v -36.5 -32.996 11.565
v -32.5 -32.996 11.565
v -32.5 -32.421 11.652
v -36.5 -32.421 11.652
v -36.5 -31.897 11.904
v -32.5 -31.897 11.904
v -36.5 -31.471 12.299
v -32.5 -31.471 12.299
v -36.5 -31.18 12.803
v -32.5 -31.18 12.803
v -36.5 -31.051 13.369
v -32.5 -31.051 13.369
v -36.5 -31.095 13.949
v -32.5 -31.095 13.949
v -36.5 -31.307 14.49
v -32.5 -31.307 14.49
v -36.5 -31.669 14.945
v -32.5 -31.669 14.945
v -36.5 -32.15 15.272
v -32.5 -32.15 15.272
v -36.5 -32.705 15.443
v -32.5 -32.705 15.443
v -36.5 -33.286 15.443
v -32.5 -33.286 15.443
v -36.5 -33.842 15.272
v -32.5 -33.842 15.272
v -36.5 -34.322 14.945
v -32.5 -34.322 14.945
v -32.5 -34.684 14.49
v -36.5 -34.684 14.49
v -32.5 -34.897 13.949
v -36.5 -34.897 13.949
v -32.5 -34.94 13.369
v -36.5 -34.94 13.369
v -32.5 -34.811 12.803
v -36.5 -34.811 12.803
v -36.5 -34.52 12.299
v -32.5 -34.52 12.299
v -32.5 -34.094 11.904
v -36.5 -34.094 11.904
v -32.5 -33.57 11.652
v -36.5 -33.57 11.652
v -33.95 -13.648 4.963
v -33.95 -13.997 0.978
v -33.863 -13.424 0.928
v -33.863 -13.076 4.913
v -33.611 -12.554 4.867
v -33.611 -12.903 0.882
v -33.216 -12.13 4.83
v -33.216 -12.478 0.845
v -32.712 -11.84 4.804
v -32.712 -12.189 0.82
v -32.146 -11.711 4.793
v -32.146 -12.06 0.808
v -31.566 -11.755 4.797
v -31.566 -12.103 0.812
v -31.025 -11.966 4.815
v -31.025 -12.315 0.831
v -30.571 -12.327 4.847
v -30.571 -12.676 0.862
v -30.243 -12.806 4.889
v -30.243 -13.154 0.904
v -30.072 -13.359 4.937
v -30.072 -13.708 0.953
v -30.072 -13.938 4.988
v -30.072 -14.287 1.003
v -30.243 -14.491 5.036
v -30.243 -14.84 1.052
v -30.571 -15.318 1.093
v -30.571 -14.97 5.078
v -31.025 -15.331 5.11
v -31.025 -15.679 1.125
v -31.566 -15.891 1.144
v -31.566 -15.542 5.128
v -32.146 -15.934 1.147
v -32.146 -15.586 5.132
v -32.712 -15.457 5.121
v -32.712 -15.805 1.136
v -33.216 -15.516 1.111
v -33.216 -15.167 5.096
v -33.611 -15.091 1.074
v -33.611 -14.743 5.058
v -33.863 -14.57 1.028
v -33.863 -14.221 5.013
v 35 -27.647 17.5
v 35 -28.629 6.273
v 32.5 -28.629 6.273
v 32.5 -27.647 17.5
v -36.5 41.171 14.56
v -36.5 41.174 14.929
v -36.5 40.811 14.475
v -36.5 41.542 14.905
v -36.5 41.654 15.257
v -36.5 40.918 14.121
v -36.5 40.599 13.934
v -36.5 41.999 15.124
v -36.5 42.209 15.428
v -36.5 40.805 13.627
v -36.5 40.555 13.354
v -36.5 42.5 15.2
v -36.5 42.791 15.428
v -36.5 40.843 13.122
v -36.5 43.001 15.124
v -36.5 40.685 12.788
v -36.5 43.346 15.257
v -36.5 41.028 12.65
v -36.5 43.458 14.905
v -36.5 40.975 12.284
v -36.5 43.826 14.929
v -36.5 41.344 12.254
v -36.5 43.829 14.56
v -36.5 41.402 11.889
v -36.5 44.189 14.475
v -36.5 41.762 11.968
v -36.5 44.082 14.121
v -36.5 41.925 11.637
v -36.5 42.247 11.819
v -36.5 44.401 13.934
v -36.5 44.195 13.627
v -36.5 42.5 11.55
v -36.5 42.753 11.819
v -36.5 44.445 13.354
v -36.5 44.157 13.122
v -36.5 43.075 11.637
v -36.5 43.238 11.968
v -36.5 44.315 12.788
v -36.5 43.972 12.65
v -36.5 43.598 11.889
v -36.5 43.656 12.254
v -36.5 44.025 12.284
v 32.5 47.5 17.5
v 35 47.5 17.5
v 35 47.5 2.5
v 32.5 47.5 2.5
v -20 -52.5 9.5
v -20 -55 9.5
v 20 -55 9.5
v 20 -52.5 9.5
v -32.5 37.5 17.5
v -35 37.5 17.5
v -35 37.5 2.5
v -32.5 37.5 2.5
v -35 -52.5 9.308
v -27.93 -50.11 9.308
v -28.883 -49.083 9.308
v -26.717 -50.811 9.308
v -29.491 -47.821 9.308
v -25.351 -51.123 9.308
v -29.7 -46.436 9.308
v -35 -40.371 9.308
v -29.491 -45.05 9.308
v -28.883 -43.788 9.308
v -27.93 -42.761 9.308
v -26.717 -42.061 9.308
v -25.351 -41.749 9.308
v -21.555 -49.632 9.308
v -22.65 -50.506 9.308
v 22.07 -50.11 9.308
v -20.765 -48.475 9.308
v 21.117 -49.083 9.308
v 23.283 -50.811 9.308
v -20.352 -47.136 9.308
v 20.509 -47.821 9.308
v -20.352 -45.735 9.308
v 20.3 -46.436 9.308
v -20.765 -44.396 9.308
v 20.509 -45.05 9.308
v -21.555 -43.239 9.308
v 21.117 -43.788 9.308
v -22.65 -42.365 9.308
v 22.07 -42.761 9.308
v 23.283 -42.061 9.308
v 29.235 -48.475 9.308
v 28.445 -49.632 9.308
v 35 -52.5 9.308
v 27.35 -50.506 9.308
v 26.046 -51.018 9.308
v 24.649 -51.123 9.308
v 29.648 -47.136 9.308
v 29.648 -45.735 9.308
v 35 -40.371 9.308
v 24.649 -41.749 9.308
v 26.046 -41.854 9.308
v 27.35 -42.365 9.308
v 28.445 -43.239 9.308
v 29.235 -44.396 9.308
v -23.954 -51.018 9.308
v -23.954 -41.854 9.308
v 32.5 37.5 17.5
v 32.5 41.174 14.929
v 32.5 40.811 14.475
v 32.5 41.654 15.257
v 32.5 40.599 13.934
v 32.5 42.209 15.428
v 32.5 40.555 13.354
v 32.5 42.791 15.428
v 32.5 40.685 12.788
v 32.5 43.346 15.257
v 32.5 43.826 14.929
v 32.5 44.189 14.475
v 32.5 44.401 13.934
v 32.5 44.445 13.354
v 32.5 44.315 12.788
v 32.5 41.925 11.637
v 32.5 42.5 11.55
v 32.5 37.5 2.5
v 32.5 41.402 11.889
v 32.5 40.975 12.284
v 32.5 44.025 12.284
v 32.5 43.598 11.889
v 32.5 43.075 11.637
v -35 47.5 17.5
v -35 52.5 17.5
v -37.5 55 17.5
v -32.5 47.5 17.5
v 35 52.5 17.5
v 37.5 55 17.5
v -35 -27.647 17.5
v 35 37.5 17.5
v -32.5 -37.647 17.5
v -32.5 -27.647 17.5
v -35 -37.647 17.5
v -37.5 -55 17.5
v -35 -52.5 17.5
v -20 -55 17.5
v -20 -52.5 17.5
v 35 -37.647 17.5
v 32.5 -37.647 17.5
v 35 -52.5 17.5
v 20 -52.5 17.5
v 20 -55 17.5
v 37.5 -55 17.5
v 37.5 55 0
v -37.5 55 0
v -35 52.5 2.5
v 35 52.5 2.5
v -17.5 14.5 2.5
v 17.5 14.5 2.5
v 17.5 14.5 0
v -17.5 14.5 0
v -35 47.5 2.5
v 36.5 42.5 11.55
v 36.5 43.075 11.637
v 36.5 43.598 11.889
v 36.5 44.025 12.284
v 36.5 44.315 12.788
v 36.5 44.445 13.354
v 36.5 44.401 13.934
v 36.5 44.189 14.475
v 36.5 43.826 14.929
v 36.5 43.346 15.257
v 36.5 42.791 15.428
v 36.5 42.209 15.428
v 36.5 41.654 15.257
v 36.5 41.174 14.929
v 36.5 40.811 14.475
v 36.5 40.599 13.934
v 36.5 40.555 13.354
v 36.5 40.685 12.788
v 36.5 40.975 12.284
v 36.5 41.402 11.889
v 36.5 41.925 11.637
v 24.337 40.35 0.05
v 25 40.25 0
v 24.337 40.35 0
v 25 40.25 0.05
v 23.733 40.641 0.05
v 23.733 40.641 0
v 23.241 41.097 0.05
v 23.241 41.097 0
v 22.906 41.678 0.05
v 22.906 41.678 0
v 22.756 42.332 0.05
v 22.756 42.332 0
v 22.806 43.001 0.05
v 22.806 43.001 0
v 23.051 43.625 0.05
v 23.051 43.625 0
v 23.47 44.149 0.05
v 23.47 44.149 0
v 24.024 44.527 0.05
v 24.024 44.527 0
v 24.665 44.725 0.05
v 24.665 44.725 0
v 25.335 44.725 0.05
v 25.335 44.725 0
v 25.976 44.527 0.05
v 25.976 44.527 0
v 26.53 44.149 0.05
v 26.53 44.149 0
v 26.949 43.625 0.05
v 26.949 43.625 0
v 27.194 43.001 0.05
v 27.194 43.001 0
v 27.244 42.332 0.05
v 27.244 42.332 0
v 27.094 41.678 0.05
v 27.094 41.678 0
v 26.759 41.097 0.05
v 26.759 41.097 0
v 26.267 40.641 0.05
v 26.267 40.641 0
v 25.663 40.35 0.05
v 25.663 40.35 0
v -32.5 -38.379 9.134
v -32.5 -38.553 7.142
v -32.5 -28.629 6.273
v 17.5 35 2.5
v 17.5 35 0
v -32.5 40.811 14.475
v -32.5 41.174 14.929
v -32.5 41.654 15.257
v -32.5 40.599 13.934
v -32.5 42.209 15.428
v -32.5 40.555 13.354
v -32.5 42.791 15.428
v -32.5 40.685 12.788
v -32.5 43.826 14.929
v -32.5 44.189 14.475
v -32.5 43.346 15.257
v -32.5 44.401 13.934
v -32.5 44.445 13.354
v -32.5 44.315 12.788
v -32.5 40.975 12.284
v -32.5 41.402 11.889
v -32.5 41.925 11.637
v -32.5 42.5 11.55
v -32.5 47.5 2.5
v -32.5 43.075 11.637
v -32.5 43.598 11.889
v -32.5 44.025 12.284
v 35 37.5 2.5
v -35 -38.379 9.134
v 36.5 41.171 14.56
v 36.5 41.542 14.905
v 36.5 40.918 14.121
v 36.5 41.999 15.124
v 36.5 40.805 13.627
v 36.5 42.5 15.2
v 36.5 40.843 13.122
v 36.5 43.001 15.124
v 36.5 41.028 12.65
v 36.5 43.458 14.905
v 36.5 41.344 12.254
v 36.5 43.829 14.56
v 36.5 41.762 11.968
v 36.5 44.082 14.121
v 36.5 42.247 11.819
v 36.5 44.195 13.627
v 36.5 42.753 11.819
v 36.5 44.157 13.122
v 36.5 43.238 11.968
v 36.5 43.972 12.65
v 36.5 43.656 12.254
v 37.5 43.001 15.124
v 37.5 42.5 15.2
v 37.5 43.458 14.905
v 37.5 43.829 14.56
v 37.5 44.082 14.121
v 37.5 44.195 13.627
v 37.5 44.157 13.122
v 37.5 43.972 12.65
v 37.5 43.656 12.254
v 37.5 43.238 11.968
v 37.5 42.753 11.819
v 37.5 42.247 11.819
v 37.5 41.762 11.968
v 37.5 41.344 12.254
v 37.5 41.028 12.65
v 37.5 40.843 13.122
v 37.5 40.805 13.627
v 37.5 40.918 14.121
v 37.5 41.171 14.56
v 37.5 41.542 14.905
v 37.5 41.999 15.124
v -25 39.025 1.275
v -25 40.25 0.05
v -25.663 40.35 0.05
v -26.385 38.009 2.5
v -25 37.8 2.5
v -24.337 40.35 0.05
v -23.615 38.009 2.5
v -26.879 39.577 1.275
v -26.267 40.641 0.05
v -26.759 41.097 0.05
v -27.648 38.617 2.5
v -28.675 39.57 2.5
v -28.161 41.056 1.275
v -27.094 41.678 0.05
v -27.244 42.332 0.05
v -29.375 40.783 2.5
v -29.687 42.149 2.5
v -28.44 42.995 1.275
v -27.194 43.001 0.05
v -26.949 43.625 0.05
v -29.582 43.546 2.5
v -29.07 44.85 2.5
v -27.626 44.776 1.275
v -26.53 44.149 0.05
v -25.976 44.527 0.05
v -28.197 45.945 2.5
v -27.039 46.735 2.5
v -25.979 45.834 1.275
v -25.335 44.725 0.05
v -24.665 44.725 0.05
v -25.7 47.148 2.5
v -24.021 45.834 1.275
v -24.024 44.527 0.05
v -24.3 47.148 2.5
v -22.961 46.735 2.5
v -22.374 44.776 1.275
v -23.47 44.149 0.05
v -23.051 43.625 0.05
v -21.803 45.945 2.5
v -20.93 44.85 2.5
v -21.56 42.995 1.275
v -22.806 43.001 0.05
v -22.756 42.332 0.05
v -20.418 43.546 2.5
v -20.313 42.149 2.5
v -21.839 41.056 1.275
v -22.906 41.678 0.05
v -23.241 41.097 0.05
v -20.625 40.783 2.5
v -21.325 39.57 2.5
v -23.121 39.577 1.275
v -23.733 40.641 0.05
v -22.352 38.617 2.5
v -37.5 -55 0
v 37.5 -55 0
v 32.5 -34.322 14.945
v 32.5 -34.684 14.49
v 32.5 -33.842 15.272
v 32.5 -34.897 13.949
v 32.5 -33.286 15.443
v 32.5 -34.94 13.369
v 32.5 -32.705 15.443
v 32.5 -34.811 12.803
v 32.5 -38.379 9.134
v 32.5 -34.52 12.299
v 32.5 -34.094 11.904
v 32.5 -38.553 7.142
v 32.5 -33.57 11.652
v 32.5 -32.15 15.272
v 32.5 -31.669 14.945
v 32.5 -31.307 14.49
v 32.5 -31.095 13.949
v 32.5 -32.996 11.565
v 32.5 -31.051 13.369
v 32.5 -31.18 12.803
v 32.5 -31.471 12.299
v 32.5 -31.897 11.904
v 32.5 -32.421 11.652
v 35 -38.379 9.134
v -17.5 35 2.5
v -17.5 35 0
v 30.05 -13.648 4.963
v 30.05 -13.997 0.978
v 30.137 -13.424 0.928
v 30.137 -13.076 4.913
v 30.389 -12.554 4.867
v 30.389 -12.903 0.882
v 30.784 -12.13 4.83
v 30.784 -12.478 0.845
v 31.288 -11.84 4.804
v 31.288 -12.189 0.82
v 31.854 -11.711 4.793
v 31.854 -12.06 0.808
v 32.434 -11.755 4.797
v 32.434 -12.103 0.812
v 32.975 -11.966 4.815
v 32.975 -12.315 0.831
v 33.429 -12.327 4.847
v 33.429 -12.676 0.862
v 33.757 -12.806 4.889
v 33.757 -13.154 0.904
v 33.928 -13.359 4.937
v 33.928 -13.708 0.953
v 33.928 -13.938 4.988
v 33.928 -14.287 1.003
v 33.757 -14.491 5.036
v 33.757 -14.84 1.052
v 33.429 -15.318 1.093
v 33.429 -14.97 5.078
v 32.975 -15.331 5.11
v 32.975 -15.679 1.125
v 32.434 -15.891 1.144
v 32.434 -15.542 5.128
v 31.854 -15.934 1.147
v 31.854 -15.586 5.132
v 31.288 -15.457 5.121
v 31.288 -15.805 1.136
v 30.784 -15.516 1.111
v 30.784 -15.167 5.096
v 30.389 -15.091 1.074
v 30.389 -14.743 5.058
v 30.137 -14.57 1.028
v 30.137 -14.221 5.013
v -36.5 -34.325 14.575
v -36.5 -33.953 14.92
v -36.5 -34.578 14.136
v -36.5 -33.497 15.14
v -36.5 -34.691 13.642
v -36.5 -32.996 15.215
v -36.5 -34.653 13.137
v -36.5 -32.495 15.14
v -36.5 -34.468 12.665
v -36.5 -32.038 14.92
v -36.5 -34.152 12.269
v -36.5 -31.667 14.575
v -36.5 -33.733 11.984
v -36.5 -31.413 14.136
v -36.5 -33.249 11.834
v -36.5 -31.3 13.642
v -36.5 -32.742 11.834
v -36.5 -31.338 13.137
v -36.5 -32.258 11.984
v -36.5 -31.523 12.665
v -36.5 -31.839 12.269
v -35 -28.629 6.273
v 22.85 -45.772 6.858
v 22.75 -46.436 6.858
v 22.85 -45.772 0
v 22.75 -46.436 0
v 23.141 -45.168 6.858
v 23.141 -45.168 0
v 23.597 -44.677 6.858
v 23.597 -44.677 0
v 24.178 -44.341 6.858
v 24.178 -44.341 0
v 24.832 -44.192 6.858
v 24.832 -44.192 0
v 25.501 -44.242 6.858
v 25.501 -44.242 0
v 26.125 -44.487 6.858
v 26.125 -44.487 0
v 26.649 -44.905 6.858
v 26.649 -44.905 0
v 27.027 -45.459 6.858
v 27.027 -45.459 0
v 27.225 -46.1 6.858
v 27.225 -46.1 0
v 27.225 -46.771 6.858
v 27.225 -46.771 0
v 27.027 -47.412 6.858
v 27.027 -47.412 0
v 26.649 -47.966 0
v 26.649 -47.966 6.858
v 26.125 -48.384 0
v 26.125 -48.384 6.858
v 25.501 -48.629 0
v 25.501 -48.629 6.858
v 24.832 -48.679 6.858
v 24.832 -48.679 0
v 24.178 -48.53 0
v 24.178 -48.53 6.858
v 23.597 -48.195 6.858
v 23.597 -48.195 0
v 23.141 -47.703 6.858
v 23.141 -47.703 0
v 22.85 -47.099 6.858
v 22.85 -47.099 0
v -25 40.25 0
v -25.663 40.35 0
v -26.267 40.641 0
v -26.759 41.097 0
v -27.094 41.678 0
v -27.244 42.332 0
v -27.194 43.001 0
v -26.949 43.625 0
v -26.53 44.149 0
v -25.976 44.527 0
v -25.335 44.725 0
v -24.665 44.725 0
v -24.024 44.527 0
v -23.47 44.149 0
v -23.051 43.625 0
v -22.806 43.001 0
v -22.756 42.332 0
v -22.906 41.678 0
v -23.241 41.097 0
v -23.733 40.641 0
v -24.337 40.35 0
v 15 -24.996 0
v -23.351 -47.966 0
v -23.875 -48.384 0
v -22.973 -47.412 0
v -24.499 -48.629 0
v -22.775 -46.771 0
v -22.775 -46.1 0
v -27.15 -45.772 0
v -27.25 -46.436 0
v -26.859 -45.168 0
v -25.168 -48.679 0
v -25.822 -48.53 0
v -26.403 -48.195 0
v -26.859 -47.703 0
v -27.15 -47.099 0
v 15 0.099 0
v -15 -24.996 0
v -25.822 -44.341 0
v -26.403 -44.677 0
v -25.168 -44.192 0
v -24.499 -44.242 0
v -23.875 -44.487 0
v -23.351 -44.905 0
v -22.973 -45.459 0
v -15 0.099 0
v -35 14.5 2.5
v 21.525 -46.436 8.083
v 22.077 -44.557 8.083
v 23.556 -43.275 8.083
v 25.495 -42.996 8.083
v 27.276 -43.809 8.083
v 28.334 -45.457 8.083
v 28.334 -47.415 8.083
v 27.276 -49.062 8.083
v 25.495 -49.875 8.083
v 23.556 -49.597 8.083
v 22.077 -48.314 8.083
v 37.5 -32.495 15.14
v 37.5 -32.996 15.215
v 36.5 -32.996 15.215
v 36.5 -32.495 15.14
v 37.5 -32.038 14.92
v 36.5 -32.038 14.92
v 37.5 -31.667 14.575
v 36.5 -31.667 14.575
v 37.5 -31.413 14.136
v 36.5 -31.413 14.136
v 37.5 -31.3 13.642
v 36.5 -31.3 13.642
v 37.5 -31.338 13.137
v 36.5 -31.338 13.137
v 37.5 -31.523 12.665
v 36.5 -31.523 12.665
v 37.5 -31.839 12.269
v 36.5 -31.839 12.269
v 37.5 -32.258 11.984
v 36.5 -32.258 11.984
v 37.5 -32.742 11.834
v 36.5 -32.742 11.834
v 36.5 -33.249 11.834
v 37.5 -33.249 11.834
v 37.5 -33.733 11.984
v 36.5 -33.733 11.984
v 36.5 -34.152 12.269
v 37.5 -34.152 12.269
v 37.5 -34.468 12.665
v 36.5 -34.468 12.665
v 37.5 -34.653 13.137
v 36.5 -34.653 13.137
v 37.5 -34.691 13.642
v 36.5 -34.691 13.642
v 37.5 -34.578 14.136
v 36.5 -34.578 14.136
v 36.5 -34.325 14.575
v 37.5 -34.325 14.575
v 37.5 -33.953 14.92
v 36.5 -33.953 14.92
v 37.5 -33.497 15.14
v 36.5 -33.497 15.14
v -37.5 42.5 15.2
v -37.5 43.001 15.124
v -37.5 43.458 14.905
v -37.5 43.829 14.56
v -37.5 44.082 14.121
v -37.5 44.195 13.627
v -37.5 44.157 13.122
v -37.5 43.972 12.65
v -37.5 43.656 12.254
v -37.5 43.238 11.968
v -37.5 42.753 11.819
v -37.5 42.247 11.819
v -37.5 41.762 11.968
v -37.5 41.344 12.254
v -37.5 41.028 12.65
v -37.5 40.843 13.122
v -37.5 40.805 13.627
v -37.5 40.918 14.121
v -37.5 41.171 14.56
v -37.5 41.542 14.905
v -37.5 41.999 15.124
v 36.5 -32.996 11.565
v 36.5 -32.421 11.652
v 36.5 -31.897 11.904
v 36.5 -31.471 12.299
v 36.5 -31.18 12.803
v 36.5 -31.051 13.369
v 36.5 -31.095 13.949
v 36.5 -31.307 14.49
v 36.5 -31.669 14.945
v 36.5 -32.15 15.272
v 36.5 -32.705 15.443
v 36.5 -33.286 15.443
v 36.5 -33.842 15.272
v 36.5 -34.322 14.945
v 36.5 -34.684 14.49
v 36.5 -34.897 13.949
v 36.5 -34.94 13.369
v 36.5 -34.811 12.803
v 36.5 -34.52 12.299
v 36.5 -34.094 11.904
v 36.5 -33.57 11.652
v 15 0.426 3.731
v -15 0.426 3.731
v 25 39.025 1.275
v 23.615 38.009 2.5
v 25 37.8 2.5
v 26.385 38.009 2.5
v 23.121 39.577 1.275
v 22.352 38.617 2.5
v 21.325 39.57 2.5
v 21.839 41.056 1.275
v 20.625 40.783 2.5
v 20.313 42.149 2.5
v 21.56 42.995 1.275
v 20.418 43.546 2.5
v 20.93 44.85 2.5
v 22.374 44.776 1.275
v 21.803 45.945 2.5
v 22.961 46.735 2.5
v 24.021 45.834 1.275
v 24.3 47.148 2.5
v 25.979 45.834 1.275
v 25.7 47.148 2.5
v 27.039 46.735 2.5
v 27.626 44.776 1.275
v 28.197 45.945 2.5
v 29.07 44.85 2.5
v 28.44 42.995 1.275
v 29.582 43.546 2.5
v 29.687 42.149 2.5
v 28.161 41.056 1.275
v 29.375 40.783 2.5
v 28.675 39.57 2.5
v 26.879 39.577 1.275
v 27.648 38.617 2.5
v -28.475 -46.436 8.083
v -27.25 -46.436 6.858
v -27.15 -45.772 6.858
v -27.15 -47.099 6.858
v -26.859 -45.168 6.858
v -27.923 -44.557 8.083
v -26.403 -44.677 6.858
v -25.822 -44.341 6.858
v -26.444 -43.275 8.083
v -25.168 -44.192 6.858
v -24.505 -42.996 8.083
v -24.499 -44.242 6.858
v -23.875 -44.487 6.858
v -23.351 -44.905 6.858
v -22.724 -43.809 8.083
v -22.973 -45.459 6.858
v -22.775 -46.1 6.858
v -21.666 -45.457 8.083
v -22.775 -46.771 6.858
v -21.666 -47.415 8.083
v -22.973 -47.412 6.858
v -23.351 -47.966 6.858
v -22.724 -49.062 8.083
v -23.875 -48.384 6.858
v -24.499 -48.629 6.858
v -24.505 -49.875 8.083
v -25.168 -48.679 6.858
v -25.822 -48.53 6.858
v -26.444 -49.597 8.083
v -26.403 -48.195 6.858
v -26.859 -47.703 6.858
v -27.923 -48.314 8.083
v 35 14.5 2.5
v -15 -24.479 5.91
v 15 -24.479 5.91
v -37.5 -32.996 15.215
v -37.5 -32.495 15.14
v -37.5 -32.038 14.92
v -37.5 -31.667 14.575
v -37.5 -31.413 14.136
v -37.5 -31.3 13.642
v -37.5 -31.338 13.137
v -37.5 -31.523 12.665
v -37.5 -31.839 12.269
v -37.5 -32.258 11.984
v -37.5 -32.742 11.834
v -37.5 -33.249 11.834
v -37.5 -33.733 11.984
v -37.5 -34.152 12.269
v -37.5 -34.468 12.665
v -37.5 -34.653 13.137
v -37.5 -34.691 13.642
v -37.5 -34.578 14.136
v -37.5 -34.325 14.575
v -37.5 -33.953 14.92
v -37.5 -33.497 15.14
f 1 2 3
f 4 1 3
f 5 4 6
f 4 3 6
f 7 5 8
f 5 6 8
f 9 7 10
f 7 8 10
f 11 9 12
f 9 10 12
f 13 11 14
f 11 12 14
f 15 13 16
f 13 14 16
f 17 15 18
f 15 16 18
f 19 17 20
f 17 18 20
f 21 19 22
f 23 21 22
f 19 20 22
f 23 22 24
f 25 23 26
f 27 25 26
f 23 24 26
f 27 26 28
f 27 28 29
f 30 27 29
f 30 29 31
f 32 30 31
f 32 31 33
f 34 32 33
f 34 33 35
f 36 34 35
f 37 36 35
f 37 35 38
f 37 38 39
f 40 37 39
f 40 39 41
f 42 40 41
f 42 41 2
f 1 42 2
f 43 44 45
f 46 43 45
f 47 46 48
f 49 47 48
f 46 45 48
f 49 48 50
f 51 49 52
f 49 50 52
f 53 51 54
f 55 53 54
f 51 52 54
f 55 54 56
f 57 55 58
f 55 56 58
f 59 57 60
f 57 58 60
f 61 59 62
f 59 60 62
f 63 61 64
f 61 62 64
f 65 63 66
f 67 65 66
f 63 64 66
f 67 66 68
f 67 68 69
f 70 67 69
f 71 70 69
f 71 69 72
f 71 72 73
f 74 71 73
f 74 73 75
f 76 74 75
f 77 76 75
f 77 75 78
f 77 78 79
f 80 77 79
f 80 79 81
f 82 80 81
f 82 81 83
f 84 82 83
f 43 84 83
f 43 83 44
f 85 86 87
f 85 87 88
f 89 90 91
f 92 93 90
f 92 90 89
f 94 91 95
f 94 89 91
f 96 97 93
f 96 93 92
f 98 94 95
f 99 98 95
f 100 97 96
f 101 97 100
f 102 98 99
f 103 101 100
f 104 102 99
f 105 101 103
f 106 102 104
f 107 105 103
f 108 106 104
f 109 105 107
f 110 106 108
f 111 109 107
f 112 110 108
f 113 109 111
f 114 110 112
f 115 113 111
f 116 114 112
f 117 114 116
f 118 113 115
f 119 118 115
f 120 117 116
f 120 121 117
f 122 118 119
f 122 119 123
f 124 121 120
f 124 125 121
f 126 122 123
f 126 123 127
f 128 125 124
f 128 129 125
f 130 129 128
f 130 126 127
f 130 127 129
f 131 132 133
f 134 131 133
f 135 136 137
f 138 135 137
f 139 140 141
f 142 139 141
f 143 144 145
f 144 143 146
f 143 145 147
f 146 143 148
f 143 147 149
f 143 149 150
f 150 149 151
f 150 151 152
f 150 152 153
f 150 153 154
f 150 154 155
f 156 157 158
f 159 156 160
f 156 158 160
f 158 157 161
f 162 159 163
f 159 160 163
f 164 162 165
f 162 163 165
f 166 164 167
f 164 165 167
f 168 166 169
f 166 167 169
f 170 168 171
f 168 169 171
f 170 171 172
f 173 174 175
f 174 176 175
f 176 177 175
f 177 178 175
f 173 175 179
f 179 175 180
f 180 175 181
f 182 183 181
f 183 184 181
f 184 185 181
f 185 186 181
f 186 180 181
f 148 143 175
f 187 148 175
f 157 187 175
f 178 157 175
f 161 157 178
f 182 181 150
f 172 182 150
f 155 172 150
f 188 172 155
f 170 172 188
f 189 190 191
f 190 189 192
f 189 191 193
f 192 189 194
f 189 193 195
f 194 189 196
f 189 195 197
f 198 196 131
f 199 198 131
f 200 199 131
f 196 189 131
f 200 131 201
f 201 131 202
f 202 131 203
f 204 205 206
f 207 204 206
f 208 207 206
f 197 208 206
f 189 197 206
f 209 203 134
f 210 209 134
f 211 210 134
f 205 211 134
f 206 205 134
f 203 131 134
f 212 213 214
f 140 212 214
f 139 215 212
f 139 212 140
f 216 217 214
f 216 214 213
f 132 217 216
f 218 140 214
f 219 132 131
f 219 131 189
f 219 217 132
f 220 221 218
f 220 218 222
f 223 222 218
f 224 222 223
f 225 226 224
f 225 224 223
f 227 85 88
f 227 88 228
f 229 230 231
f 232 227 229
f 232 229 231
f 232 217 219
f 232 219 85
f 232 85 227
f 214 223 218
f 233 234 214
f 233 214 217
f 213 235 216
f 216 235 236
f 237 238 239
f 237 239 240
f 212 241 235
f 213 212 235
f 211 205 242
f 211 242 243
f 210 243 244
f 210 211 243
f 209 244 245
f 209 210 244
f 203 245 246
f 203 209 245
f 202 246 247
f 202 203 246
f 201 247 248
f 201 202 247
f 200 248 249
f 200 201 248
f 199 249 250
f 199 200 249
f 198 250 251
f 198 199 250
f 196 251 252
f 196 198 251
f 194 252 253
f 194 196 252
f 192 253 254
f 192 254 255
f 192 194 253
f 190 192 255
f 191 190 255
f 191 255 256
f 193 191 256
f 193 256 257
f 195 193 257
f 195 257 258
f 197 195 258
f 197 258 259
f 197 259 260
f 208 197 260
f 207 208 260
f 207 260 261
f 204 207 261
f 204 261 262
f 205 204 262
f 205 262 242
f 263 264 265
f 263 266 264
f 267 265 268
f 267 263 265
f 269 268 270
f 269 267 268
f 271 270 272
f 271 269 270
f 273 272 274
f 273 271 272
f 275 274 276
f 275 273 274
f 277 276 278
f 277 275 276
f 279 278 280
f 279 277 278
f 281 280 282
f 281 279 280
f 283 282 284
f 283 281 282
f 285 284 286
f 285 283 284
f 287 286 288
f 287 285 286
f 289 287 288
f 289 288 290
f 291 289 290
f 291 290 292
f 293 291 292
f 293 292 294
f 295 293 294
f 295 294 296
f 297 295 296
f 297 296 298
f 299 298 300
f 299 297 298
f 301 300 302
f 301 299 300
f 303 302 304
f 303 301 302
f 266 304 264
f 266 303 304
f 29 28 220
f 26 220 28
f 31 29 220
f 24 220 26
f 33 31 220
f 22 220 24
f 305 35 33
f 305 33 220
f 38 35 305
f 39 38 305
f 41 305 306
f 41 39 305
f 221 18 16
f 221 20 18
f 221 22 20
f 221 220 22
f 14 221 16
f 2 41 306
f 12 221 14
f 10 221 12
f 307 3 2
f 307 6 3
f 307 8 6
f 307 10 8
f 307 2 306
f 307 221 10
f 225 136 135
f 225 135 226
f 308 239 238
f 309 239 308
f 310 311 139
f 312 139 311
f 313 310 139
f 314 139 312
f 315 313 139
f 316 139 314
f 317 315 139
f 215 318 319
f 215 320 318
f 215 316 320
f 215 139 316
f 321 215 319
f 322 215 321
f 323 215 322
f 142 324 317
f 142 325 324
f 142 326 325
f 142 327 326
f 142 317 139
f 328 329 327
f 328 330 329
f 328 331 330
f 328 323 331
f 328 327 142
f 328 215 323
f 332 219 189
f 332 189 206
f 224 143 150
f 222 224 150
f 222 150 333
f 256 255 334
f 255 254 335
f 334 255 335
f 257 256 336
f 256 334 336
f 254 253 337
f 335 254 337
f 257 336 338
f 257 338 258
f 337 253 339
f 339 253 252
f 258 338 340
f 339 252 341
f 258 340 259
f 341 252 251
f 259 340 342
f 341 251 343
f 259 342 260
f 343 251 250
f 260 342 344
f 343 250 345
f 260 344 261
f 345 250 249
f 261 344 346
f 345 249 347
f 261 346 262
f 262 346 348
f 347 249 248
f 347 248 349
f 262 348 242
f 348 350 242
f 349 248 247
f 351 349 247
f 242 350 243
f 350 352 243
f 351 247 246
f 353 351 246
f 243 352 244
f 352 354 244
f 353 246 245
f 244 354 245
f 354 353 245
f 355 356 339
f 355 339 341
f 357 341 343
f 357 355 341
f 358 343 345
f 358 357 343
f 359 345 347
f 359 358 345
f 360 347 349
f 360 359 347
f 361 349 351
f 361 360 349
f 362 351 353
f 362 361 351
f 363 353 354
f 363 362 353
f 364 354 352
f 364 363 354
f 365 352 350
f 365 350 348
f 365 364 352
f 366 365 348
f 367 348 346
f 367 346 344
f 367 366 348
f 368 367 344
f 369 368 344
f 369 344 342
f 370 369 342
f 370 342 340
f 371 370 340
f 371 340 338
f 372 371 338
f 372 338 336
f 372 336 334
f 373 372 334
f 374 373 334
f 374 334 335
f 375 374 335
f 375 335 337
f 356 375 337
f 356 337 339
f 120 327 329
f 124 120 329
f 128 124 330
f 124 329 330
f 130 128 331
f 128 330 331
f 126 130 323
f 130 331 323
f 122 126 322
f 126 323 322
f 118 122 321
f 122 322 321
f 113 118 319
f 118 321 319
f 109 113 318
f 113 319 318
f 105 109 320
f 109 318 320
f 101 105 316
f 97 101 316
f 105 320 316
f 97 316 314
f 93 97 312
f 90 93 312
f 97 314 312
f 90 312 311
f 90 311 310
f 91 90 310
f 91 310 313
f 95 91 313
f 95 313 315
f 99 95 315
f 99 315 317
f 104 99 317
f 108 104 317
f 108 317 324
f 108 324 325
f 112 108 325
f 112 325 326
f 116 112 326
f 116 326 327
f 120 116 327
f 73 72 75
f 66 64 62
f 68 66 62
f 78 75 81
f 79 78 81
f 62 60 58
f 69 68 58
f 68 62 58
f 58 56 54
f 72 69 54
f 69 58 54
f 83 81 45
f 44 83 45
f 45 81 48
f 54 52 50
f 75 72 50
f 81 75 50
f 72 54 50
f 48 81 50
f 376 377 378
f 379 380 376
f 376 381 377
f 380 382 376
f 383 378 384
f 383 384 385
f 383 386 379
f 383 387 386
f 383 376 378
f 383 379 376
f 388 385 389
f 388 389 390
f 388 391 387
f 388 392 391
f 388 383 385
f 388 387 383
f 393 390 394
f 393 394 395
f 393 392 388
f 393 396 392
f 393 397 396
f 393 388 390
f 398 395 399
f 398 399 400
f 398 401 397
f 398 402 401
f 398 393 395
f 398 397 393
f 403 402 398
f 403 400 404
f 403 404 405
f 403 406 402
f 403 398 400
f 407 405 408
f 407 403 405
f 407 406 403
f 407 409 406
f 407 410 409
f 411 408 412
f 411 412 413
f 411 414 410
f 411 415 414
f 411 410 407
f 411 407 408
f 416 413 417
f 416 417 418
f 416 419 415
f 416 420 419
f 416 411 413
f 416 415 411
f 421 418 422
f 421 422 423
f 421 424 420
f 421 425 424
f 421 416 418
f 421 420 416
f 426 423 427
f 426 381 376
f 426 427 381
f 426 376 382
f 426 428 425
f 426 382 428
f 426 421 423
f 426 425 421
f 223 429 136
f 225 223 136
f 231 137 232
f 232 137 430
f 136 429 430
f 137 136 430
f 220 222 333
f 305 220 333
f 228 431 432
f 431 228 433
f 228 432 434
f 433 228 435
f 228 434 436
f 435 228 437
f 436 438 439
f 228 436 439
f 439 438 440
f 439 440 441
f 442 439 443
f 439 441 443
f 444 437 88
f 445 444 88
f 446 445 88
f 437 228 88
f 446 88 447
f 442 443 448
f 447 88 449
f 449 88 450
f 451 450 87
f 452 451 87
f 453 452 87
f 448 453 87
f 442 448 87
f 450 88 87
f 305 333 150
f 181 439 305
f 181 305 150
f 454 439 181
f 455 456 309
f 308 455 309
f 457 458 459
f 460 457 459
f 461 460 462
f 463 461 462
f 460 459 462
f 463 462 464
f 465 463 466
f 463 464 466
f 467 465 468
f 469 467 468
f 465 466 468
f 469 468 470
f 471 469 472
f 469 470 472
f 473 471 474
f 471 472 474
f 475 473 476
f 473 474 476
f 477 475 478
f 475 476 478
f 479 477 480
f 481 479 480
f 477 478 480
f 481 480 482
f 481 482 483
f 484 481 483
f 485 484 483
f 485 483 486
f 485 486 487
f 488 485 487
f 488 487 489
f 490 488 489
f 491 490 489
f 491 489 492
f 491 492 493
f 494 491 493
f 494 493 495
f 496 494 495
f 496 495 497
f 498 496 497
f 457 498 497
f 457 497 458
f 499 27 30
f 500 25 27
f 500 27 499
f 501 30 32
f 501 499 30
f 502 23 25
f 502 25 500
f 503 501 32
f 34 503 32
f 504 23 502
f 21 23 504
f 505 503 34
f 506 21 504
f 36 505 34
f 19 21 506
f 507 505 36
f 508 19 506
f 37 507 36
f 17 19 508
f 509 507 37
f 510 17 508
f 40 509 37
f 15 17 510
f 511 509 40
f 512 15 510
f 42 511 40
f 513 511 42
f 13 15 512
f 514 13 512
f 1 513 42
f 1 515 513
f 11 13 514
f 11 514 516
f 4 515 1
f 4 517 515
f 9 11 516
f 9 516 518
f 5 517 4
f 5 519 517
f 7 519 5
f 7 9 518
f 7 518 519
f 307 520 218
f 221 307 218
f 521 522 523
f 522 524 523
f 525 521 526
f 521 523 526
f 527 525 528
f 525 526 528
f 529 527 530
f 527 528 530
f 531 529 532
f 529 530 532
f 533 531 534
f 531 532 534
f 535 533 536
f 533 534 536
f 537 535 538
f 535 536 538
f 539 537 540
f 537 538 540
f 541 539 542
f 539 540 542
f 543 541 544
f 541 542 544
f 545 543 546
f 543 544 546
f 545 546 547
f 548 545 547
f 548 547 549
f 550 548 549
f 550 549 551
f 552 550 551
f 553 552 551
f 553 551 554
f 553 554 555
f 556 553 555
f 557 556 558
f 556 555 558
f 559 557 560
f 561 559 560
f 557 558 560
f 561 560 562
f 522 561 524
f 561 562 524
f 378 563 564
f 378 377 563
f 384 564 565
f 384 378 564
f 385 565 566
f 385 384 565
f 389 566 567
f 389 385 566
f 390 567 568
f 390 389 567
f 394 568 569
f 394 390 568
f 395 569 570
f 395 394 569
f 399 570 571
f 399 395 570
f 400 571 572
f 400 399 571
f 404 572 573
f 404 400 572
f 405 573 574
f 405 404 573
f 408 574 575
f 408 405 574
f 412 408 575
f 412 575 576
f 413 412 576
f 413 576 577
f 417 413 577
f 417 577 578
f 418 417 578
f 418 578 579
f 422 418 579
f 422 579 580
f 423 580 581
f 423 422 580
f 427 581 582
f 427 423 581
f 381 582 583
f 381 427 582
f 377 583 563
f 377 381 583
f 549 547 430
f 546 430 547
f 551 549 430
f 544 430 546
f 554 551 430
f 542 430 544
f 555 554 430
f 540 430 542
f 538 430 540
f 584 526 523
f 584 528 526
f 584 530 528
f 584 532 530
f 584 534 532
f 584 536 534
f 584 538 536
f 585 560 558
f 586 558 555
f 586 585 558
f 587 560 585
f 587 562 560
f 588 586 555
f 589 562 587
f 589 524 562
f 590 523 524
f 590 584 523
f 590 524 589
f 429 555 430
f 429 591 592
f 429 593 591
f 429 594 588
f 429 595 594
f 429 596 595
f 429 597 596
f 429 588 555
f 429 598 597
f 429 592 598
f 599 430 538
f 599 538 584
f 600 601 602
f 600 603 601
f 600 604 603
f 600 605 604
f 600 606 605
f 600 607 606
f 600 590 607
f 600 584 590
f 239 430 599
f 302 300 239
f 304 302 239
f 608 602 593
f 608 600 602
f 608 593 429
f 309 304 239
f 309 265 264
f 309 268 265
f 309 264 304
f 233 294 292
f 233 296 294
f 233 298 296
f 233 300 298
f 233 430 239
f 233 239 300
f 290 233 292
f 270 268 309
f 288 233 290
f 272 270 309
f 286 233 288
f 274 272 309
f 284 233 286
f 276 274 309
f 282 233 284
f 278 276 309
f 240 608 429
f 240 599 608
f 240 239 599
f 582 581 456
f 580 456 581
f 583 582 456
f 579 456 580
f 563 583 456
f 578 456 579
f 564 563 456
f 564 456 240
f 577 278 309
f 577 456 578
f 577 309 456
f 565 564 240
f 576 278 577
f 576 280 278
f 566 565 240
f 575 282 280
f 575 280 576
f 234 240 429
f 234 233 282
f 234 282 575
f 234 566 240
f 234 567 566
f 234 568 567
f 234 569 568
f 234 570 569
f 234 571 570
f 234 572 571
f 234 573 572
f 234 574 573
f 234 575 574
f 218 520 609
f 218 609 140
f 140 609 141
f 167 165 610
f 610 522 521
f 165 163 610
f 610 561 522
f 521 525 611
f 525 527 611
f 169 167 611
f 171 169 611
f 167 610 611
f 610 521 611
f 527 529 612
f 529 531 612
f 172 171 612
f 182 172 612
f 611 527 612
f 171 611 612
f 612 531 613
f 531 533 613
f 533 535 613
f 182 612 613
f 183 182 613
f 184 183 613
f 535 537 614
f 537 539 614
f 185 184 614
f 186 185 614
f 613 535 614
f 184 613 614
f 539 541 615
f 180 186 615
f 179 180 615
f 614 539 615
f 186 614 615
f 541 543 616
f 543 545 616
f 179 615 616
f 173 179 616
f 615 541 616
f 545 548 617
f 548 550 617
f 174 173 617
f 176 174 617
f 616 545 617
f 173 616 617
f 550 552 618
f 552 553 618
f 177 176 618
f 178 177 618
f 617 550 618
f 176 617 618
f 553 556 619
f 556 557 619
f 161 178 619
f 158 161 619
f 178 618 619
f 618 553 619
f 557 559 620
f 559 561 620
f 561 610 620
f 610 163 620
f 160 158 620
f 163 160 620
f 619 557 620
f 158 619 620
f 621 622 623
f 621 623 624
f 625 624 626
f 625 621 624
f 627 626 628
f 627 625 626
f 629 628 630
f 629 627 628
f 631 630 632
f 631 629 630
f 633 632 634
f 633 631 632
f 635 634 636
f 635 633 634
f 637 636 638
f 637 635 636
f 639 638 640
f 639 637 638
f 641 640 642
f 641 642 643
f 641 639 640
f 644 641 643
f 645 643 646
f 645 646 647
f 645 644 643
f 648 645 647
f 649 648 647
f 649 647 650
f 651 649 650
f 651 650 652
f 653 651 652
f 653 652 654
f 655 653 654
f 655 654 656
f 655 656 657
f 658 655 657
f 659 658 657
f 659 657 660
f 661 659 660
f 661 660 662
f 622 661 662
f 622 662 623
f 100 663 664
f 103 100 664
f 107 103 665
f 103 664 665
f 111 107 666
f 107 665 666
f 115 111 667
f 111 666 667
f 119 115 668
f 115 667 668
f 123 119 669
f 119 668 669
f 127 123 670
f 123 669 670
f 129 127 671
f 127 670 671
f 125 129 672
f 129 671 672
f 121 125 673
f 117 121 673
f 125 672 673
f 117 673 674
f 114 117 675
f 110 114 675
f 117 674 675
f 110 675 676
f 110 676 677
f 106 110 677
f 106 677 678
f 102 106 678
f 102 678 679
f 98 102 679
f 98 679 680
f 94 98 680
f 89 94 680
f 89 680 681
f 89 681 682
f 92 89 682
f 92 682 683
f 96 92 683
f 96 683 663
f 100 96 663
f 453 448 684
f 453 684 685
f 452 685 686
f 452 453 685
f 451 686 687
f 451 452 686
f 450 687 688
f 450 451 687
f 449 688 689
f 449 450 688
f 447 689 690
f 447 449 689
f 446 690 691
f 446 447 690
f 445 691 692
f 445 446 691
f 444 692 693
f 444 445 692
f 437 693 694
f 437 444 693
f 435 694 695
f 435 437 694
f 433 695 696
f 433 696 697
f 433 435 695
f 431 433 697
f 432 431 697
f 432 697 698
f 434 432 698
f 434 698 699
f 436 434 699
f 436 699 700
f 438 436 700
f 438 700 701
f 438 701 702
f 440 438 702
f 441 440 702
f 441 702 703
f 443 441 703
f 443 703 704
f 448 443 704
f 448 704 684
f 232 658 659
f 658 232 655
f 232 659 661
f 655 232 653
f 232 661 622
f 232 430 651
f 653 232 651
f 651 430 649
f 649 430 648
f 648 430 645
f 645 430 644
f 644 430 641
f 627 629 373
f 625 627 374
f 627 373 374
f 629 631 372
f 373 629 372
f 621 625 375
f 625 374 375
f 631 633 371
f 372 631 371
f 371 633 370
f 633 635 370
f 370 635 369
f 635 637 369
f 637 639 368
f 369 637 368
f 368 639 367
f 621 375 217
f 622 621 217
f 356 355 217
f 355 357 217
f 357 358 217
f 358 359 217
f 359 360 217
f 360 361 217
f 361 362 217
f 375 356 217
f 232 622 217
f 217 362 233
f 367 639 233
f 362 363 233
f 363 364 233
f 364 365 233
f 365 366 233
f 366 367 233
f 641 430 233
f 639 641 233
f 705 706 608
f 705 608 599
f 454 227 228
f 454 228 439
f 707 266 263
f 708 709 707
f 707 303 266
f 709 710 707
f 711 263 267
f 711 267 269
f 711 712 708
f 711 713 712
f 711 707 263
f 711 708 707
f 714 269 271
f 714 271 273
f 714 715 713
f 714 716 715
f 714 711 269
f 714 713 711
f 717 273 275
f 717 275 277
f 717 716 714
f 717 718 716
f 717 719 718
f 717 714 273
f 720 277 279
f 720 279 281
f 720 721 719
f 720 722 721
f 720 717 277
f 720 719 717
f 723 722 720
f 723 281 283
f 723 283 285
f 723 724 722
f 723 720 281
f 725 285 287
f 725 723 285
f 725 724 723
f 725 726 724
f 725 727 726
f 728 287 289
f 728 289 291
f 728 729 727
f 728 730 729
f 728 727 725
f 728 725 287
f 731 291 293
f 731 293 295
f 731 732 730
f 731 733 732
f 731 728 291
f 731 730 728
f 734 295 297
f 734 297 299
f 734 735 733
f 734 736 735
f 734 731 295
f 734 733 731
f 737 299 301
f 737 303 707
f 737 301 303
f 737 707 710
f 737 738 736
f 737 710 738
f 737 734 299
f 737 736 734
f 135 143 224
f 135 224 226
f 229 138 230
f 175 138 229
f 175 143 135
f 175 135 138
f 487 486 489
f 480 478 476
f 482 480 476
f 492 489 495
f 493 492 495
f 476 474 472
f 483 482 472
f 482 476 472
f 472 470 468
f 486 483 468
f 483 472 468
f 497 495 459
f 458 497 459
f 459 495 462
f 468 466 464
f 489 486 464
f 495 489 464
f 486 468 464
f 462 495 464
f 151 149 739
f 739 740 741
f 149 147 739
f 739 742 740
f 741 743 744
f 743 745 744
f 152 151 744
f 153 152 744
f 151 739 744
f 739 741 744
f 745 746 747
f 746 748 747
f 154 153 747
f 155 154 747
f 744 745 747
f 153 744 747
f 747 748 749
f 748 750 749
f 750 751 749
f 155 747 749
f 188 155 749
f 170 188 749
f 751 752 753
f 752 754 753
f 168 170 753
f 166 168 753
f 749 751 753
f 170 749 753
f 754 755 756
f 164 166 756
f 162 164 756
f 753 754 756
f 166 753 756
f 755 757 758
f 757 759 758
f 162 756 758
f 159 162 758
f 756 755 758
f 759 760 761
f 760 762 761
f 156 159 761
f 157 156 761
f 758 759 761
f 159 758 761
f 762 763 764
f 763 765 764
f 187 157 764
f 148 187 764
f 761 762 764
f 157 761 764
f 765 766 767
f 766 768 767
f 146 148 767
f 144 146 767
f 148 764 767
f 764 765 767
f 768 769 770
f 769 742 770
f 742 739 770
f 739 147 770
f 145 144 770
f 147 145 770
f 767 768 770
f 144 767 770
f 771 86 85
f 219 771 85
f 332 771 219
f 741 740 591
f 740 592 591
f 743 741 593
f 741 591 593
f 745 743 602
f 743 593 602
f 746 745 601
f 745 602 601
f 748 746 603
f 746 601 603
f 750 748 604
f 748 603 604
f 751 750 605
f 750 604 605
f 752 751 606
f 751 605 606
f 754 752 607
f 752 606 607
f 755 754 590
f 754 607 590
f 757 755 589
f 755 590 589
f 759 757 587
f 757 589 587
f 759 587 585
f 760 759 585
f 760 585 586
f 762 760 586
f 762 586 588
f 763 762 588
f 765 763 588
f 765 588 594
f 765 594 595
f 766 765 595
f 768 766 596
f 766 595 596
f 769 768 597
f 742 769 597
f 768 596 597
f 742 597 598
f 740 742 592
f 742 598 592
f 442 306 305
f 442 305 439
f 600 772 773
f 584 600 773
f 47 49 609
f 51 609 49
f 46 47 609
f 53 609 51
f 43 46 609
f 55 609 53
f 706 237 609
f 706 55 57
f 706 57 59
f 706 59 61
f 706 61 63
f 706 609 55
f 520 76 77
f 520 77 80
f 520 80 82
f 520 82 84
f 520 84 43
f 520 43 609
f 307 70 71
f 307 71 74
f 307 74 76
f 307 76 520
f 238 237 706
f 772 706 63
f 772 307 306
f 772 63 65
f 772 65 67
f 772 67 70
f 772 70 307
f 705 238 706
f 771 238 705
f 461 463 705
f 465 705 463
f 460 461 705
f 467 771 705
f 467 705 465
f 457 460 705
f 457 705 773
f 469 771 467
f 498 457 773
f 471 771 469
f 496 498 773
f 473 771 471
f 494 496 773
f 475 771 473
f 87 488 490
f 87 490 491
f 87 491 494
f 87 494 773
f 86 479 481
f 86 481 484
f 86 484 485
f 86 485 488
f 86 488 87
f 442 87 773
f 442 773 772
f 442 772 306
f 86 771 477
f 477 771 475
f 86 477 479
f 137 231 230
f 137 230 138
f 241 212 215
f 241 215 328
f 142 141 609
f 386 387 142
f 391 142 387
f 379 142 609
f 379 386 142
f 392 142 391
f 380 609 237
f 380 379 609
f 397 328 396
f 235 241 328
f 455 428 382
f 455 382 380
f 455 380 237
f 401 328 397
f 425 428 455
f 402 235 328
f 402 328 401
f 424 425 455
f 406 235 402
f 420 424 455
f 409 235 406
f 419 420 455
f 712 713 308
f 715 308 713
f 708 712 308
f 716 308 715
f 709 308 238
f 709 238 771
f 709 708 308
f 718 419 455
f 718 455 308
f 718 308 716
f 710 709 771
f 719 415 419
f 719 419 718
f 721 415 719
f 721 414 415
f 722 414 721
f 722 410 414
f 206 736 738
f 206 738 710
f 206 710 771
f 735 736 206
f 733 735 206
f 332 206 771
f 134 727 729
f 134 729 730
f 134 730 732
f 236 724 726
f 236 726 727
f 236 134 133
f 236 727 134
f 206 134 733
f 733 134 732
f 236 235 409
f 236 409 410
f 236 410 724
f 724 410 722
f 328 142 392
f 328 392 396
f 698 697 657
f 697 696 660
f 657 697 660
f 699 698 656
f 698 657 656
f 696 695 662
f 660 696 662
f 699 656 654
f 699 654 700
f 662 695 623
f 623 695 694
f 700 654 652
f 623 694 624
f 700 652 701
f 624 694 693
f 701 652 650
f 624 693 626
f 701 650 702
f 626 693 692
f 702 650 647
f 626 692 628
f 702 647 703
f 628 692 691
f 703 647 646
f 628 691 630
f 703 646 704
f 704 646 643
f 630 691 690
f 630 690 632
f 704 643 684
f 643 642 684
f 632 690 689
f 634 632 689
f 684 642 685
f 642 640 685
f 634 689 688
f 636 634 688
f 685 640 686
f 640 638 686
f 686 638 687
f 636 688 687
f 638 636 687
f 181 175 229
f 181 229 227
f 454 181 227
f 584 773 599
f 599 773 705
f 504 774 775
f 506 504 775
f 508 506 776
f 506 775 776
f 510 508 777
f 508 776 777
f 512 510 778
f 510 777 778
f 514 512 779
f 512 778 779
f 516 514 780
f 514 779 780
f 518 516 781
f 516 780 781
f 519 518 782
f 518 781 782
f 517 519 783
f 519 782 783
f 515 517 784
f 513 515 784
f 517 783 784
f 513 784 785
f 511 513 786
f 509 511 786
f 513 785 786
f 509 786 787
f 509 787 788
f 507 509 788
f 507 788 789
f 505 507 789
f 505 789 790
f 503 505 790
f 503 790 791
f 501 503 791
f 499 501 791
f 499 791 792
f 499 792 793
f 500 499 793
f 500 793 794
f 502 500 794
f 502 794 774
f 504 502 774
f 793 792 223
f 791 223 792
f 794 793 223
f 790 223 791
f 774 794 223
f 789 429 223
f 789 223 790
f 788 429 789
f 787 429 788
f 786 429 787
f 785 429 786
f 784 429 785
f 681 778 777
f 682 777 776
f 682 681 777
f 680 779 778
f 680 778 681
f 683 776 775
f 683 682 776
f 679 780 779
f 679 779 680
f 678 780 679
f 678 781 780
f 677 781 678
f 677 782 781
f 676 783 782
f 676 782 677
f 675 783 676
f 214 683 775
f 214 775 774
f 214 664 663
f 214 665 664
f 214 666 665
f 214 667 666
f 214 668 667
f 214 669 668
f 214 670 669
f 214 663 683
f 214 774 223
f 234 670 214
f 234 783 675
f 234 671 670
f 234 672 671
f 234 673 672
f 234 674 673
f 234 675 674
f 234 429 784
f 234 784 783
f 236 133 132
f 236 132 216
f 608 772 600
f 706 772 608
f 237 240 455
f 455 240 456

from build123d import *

# Parameters (mm, degrees)
SKICA1_W                                          = 75
SKICA1_H                                          = 110
SKICA1_W_2                                        = 35
SKICA1_H_2                                        = 70
P_IDAT_VYSUNUT_M1_DEPTH                           = 2.5
SKICA2_W                                          = 75
SKICA2_H                                          = 110
SKICA2_W_2                                        = 70
SKICA2_H_2                                        = 105
P_IDAT_VYSUNUT_M2_DEPTH                           = 15
P_IDAT_VYSUNUT_M3_REACH                           = 94.669
SKICA4_W                                          = 35
SKICA4_H                                          = 49.5
P_IDAT_VYSUNUT_M4_DEPTH                           = 2.5
SKICA5_W                                          = 70
SKICA5_H                                          = 2
P_IDAT_VYSUNUT_M5_DEPTH                           = 2
P_IDAT_VYSUNUT_M7_REACH                           = 94.669
KU_ELOV_ZAHLOUBEN_PRO_M4_ROUBU_SE_Z_P_D           = 4.5
KU_ELOV_ZAHLOUBEN_PRO_M4_ROUBU_SE_Z_P_CSINK_D     = 9.4
KU_ELOV_ZAHLOUBEN_PRO_M4_ROUBU_SE_Z_P_CSINK_ANGLE = 90
KU_ELOV_ZAHLOUBEN_PRO_M4_ROUBU_SE_2_A_COUNT       = 2
KU_ELOV_ZAHLOUBEN_PRO_M4_ROUBU_SE_2_A_PITCH       = 50
D_RY_PRO_KOL_K_VELIKOST_MM1_D                     = 3.9
D_RY_PRO_KOL_K_VELIKOST_MM1_DEPTH                 = 4
SKICA19_W                                         = 30
SKICA19_H                                         = 25
ODEBRAT_VYSUNUT_M1_DEPTH                          = 69.239931365
ODEBRAT_VYSUNUT_M4_DEPTH                          = 10
SKICA21_W                                         = 15
SKICA21_H                                         = 10
P_IDAT_VYSUNUT_M8_DEPTH                           = 2.5
V_LCOV_ZAHLOUBEN_PRO_M3_ROUBY_S_VNIT_D            = 3.4
V_LCOV_ZAHLOUBEN_PRO_M3_ROUBY_S_VNIT_DEPTH        = 5
V_LCOV_ZAHLOUBEN_PRO_M3_ROUBY_S_VNIT_CBORE_D      = 3.9
V_LCOV_ZAHLOUBEN_PRO_M3_ROUBY_S_VNIT_CBORE_DEPTH  = 4


with BuildPart() as part:
    # Skica1 → Přidat vysunutím1 (new body)
    with BuildSketch(Plane.XY):
        Rectangle(SKICA1_W, SKICA1_H)
        Rectangle(SKICA1_W_2, SKICA1_H_2, mode=Mode.SUBTRACT)
    extrude(amount=P_IDAT_VYSUNUT_M1_DEPTH)

    # Skica2 → Přidat vysunutím2 (add)
    with BuildSketch(Plane.XY.offset(2.5)):
        Rectangle(SKICA2_W, SKICA2_H)
        Rectangle(SKICA2_W_2, SKICA2_H_2, mode=Mode.SUBTRACT)
    extrude(amount=P_IDAT_VYSUNUT_M2_DEPTH)

    # Skica3 → Přidat vysunutím3 (add, up to next)
    with BuildSketch(Plane.ZY.offset(-35), mode=Mode.PRIVATE) as p_idat_vysunut_m3_sk1:
        Polygon((2.5, -52.5), (2.5, 14.5), (8.361740456, -52.5), align=None)
    p_idat_vysunut_m3_tool1 = extrude(p_idat_vysunut_m3_sk1.sketch, amount=P_IDAT_VYSUNUT_M3_REACH, mode=Mode.PRIVATE) - part.part
    add(p_idat_vysunut_m3_tool1.solids().sort_by_distance((35, -30.166667, 4.453913))[0])

    # Skica4 → Přidat vysunutím4 (add)
    with BuildSketch(Plane(origin=(0, 0, 2.5), x_dir=(-1, 0, 0), z_dir=(0, 0, -1))):
        with Locations((0, -10.25)):
            Rectangle(SKICA4_W, SKICA4_H)
    extrude(amount=P_IDAT_VYSUNUT_M4_DEPTH)

    # Skica5 → Přidat vysunutím5 (add)
    with BuildSketch(Plane(origin=(0, 0.327204013, 3.739958979), x_dir=(1, 0, 0), z_dir=(0, 0.08715574274765159, 0.9961946980917462))):
        with Locations((0, -40.02899535)):
            Rectangle(SKICA5_W, SKICA5_H)
    extrude(amount=P_IDAT_VYSUNUT_M5_DEPTH)

    # Skica9 → Přidat vysunutím7 (add, up to next)
    with BuildSketch(Plane.ZY.offset(-35), mode=Mode.PRIVATE) as p_idat_vysunut_m7_sk1:
        Polygon((9.308260939, -52.5), (9.308260939, -40.371352137), (7.315871543, -40.545663623), (8.361740456, -52.5), align=None)
    p_idat_vysunut_m7_tool1 = extrude(p_idat_vysunut_m7_sk1.sketch, amount=P_IDAT_VYSUNUT_M7_REACH, mode=Mode.PRIVATE) - part.part
    add(p_idat_vysunut_m7_tool1.solids().sort_by_distance((35, -45.761665, 8.543512))[0])

    # Ku_elov_ zahlouben_ pro M4 _roubu se z_p (through all)
    with Locations(Plane.XY.offset(9.308260939)):
        with Locations((25, -46.435676069), (-25, -46.435676069)):
            CounterSinkHole(KU_ELOV_ZAHLOUBEN_PRO_M4_ROUBU_SE_Z_P_D / 2, KU_ELOV_ZAHLOUBEN_PRO_M4_ROUBU_SE_Z_P_CSINK_D / 2, counter_sink_angle=KU_ELOV_ZAHLOUBEN_PRO_M4_ROUBU_SE_Z_P_CSINK_ANGLE)

    # Skica15 → Ku_elov_ zahlouben_ pro M4 _roubu se 2 (revolve, cut)
    with BuildSketch(Plane(origin=(25, 42.5, 2.5), x_dir=(0, -1, 0), z_dir=(1, 0, 0))):
        Polygon((0, 0), (0, 2.5), (2.25, 2.5), (2.25, 2.45), (4.7, 0), align=None)
    ku_elov_zahlouben_pro_m4_roubu_se_2 = revolve(axis=Axis((25, 42.5, 8.85), (0, 0, -1)), mode=Mode.SUBTRACT)

    # Ku_elov_ zahlouben_ pro M4 _roubu se 2 a: Ku_elov_ zahlouben_ pro M4 _roubu se 2 ×2
    with Locations(*[(-i * KU_ELOV_ZAHLOUBEN_PRO_M4_ROUBU_SE_2_A_PITCH, 0, 0) for i in range(1, KU_ELOV_ZAHLOUBEN_PRO_M4_ROUBU_SE_2_A_COUNT)]):
        add(ku_elov_zahlouben_pro_m4_roubu_se_2, mode=Mode.SUBTRACT)

    # Díry pro kolík, velikost mm1
    with Locations(Plane(origin=(0, 0.327204013, 3.739958979), x_dir=(1, 0, 0), z_dir=(0, 0.08715574274765159, 0.9961946980917462))):
        with Locations((32, -14.02899535), (-32, -14.02899535)):
            Hole(D_RY_PRO_KOL_K_VELIKOST_MM1_D / 2, depth=D_RY_PRO_KOL_K_VELIKOST_MM1_DEPTH)

    # Skica19 → Odebrat vysunutím1 (cut, through all)
    with BuildSketch(Plane(origin=(0, 0.327204013, 3.739958979), x_dir=(1, 0, 0), z_dir=(0, 0.08715574274765159, 0.9961946980917462))):
        with Locations((0, -12.401030792)):
            Rectangle(SKICA19_W, SKICA19_H)
    extrude(amount=-ODEBRAT_VYSUNUT_M1_DEPTH, mode=Mode.SUBTRACT)

    # Skica20 → Odebrat vysunutím4 (cut)
    with BuildSketch(Plane.XZ.offset(55)):
        Polygon((0, 9.5), (-20, 9.5), (-20, 17.5), (20, 17.5), (20, 9.5), align=None)
    extrude(amount=-ODEBRAT_VYSUNUT_M4_DEPTH, mode=Mode.SUBTRACT)

    # Skica21 → Přidat vysunutím8 (add)
    with BuildSketch(Plane(origin=(-35, 0, 0), x_dir=(0, 0, -1), z_dir=(1, 0, 0))):
        Polygon((-7.141560058, -38.553274227), (-6.273319169, -28.629235462), (-17.5, -27.64702816), (-17.5, -37.64702816), align=None)
        with Locations((-10, 42.5)):
            Rectangle(SKICA21_W, SKICA21_H)
    p_idat_vysunut_m8 = extrude(amount=P_IDAT_VYSUNUT_M8_DEPTH)

    # Zrcadlit1: Přidat vysunutím8 across plane
    add(p_idat_vysunut_m8.mirror(Plane(origin=(0, 0, 0), x_dir=(0, 0, 1), z_dir=(1, 0, 0))))

    # Válcové zahloubení pro M3 šrouby s vnitřním šestihranem1
    with Locations(Plane(origin=(-32.5, 0, 0), x_dir=(0, 0, -1), z_dir=(1, 0, 0))):
        with Locations((-13.5, 42.5), (-13.515221208, -32.995651131)):
            v_lcov_zahlouben_pro_m3_rouby_s_vnit = CounterBoreHole(V_LCOV_ZAHLOUBEN_PRO_M3_ROUBY_S_VNIT_D / 2, V_LCOV_ZAHLOUBEN_PRO_M3_ROUBY_S_VNIT_CBORE_D / 2, V_LCOV_ZAHLOUBEN_PRO_M3_ROUBY_S_VNIT_CBORE_DEPTH, depth=V_LCOV_ZAHLOUBEN_PRO_M3_ROUBY_S_VNIT_DEPTH)

    # Zrcadlit2: Válcové zahloubení pro M3 šrouby s vnitřním šestihranem1 across plane
    add(v_lcov_zahlouben_pro_m3_rouby_s_vnit.mirror(Plane(origin=(0, 0, 0), x_dir=(0, 0, 1), z_dir=(1, 0, 0))), mode=Mode.SUBTRACT)


solid = part.part
